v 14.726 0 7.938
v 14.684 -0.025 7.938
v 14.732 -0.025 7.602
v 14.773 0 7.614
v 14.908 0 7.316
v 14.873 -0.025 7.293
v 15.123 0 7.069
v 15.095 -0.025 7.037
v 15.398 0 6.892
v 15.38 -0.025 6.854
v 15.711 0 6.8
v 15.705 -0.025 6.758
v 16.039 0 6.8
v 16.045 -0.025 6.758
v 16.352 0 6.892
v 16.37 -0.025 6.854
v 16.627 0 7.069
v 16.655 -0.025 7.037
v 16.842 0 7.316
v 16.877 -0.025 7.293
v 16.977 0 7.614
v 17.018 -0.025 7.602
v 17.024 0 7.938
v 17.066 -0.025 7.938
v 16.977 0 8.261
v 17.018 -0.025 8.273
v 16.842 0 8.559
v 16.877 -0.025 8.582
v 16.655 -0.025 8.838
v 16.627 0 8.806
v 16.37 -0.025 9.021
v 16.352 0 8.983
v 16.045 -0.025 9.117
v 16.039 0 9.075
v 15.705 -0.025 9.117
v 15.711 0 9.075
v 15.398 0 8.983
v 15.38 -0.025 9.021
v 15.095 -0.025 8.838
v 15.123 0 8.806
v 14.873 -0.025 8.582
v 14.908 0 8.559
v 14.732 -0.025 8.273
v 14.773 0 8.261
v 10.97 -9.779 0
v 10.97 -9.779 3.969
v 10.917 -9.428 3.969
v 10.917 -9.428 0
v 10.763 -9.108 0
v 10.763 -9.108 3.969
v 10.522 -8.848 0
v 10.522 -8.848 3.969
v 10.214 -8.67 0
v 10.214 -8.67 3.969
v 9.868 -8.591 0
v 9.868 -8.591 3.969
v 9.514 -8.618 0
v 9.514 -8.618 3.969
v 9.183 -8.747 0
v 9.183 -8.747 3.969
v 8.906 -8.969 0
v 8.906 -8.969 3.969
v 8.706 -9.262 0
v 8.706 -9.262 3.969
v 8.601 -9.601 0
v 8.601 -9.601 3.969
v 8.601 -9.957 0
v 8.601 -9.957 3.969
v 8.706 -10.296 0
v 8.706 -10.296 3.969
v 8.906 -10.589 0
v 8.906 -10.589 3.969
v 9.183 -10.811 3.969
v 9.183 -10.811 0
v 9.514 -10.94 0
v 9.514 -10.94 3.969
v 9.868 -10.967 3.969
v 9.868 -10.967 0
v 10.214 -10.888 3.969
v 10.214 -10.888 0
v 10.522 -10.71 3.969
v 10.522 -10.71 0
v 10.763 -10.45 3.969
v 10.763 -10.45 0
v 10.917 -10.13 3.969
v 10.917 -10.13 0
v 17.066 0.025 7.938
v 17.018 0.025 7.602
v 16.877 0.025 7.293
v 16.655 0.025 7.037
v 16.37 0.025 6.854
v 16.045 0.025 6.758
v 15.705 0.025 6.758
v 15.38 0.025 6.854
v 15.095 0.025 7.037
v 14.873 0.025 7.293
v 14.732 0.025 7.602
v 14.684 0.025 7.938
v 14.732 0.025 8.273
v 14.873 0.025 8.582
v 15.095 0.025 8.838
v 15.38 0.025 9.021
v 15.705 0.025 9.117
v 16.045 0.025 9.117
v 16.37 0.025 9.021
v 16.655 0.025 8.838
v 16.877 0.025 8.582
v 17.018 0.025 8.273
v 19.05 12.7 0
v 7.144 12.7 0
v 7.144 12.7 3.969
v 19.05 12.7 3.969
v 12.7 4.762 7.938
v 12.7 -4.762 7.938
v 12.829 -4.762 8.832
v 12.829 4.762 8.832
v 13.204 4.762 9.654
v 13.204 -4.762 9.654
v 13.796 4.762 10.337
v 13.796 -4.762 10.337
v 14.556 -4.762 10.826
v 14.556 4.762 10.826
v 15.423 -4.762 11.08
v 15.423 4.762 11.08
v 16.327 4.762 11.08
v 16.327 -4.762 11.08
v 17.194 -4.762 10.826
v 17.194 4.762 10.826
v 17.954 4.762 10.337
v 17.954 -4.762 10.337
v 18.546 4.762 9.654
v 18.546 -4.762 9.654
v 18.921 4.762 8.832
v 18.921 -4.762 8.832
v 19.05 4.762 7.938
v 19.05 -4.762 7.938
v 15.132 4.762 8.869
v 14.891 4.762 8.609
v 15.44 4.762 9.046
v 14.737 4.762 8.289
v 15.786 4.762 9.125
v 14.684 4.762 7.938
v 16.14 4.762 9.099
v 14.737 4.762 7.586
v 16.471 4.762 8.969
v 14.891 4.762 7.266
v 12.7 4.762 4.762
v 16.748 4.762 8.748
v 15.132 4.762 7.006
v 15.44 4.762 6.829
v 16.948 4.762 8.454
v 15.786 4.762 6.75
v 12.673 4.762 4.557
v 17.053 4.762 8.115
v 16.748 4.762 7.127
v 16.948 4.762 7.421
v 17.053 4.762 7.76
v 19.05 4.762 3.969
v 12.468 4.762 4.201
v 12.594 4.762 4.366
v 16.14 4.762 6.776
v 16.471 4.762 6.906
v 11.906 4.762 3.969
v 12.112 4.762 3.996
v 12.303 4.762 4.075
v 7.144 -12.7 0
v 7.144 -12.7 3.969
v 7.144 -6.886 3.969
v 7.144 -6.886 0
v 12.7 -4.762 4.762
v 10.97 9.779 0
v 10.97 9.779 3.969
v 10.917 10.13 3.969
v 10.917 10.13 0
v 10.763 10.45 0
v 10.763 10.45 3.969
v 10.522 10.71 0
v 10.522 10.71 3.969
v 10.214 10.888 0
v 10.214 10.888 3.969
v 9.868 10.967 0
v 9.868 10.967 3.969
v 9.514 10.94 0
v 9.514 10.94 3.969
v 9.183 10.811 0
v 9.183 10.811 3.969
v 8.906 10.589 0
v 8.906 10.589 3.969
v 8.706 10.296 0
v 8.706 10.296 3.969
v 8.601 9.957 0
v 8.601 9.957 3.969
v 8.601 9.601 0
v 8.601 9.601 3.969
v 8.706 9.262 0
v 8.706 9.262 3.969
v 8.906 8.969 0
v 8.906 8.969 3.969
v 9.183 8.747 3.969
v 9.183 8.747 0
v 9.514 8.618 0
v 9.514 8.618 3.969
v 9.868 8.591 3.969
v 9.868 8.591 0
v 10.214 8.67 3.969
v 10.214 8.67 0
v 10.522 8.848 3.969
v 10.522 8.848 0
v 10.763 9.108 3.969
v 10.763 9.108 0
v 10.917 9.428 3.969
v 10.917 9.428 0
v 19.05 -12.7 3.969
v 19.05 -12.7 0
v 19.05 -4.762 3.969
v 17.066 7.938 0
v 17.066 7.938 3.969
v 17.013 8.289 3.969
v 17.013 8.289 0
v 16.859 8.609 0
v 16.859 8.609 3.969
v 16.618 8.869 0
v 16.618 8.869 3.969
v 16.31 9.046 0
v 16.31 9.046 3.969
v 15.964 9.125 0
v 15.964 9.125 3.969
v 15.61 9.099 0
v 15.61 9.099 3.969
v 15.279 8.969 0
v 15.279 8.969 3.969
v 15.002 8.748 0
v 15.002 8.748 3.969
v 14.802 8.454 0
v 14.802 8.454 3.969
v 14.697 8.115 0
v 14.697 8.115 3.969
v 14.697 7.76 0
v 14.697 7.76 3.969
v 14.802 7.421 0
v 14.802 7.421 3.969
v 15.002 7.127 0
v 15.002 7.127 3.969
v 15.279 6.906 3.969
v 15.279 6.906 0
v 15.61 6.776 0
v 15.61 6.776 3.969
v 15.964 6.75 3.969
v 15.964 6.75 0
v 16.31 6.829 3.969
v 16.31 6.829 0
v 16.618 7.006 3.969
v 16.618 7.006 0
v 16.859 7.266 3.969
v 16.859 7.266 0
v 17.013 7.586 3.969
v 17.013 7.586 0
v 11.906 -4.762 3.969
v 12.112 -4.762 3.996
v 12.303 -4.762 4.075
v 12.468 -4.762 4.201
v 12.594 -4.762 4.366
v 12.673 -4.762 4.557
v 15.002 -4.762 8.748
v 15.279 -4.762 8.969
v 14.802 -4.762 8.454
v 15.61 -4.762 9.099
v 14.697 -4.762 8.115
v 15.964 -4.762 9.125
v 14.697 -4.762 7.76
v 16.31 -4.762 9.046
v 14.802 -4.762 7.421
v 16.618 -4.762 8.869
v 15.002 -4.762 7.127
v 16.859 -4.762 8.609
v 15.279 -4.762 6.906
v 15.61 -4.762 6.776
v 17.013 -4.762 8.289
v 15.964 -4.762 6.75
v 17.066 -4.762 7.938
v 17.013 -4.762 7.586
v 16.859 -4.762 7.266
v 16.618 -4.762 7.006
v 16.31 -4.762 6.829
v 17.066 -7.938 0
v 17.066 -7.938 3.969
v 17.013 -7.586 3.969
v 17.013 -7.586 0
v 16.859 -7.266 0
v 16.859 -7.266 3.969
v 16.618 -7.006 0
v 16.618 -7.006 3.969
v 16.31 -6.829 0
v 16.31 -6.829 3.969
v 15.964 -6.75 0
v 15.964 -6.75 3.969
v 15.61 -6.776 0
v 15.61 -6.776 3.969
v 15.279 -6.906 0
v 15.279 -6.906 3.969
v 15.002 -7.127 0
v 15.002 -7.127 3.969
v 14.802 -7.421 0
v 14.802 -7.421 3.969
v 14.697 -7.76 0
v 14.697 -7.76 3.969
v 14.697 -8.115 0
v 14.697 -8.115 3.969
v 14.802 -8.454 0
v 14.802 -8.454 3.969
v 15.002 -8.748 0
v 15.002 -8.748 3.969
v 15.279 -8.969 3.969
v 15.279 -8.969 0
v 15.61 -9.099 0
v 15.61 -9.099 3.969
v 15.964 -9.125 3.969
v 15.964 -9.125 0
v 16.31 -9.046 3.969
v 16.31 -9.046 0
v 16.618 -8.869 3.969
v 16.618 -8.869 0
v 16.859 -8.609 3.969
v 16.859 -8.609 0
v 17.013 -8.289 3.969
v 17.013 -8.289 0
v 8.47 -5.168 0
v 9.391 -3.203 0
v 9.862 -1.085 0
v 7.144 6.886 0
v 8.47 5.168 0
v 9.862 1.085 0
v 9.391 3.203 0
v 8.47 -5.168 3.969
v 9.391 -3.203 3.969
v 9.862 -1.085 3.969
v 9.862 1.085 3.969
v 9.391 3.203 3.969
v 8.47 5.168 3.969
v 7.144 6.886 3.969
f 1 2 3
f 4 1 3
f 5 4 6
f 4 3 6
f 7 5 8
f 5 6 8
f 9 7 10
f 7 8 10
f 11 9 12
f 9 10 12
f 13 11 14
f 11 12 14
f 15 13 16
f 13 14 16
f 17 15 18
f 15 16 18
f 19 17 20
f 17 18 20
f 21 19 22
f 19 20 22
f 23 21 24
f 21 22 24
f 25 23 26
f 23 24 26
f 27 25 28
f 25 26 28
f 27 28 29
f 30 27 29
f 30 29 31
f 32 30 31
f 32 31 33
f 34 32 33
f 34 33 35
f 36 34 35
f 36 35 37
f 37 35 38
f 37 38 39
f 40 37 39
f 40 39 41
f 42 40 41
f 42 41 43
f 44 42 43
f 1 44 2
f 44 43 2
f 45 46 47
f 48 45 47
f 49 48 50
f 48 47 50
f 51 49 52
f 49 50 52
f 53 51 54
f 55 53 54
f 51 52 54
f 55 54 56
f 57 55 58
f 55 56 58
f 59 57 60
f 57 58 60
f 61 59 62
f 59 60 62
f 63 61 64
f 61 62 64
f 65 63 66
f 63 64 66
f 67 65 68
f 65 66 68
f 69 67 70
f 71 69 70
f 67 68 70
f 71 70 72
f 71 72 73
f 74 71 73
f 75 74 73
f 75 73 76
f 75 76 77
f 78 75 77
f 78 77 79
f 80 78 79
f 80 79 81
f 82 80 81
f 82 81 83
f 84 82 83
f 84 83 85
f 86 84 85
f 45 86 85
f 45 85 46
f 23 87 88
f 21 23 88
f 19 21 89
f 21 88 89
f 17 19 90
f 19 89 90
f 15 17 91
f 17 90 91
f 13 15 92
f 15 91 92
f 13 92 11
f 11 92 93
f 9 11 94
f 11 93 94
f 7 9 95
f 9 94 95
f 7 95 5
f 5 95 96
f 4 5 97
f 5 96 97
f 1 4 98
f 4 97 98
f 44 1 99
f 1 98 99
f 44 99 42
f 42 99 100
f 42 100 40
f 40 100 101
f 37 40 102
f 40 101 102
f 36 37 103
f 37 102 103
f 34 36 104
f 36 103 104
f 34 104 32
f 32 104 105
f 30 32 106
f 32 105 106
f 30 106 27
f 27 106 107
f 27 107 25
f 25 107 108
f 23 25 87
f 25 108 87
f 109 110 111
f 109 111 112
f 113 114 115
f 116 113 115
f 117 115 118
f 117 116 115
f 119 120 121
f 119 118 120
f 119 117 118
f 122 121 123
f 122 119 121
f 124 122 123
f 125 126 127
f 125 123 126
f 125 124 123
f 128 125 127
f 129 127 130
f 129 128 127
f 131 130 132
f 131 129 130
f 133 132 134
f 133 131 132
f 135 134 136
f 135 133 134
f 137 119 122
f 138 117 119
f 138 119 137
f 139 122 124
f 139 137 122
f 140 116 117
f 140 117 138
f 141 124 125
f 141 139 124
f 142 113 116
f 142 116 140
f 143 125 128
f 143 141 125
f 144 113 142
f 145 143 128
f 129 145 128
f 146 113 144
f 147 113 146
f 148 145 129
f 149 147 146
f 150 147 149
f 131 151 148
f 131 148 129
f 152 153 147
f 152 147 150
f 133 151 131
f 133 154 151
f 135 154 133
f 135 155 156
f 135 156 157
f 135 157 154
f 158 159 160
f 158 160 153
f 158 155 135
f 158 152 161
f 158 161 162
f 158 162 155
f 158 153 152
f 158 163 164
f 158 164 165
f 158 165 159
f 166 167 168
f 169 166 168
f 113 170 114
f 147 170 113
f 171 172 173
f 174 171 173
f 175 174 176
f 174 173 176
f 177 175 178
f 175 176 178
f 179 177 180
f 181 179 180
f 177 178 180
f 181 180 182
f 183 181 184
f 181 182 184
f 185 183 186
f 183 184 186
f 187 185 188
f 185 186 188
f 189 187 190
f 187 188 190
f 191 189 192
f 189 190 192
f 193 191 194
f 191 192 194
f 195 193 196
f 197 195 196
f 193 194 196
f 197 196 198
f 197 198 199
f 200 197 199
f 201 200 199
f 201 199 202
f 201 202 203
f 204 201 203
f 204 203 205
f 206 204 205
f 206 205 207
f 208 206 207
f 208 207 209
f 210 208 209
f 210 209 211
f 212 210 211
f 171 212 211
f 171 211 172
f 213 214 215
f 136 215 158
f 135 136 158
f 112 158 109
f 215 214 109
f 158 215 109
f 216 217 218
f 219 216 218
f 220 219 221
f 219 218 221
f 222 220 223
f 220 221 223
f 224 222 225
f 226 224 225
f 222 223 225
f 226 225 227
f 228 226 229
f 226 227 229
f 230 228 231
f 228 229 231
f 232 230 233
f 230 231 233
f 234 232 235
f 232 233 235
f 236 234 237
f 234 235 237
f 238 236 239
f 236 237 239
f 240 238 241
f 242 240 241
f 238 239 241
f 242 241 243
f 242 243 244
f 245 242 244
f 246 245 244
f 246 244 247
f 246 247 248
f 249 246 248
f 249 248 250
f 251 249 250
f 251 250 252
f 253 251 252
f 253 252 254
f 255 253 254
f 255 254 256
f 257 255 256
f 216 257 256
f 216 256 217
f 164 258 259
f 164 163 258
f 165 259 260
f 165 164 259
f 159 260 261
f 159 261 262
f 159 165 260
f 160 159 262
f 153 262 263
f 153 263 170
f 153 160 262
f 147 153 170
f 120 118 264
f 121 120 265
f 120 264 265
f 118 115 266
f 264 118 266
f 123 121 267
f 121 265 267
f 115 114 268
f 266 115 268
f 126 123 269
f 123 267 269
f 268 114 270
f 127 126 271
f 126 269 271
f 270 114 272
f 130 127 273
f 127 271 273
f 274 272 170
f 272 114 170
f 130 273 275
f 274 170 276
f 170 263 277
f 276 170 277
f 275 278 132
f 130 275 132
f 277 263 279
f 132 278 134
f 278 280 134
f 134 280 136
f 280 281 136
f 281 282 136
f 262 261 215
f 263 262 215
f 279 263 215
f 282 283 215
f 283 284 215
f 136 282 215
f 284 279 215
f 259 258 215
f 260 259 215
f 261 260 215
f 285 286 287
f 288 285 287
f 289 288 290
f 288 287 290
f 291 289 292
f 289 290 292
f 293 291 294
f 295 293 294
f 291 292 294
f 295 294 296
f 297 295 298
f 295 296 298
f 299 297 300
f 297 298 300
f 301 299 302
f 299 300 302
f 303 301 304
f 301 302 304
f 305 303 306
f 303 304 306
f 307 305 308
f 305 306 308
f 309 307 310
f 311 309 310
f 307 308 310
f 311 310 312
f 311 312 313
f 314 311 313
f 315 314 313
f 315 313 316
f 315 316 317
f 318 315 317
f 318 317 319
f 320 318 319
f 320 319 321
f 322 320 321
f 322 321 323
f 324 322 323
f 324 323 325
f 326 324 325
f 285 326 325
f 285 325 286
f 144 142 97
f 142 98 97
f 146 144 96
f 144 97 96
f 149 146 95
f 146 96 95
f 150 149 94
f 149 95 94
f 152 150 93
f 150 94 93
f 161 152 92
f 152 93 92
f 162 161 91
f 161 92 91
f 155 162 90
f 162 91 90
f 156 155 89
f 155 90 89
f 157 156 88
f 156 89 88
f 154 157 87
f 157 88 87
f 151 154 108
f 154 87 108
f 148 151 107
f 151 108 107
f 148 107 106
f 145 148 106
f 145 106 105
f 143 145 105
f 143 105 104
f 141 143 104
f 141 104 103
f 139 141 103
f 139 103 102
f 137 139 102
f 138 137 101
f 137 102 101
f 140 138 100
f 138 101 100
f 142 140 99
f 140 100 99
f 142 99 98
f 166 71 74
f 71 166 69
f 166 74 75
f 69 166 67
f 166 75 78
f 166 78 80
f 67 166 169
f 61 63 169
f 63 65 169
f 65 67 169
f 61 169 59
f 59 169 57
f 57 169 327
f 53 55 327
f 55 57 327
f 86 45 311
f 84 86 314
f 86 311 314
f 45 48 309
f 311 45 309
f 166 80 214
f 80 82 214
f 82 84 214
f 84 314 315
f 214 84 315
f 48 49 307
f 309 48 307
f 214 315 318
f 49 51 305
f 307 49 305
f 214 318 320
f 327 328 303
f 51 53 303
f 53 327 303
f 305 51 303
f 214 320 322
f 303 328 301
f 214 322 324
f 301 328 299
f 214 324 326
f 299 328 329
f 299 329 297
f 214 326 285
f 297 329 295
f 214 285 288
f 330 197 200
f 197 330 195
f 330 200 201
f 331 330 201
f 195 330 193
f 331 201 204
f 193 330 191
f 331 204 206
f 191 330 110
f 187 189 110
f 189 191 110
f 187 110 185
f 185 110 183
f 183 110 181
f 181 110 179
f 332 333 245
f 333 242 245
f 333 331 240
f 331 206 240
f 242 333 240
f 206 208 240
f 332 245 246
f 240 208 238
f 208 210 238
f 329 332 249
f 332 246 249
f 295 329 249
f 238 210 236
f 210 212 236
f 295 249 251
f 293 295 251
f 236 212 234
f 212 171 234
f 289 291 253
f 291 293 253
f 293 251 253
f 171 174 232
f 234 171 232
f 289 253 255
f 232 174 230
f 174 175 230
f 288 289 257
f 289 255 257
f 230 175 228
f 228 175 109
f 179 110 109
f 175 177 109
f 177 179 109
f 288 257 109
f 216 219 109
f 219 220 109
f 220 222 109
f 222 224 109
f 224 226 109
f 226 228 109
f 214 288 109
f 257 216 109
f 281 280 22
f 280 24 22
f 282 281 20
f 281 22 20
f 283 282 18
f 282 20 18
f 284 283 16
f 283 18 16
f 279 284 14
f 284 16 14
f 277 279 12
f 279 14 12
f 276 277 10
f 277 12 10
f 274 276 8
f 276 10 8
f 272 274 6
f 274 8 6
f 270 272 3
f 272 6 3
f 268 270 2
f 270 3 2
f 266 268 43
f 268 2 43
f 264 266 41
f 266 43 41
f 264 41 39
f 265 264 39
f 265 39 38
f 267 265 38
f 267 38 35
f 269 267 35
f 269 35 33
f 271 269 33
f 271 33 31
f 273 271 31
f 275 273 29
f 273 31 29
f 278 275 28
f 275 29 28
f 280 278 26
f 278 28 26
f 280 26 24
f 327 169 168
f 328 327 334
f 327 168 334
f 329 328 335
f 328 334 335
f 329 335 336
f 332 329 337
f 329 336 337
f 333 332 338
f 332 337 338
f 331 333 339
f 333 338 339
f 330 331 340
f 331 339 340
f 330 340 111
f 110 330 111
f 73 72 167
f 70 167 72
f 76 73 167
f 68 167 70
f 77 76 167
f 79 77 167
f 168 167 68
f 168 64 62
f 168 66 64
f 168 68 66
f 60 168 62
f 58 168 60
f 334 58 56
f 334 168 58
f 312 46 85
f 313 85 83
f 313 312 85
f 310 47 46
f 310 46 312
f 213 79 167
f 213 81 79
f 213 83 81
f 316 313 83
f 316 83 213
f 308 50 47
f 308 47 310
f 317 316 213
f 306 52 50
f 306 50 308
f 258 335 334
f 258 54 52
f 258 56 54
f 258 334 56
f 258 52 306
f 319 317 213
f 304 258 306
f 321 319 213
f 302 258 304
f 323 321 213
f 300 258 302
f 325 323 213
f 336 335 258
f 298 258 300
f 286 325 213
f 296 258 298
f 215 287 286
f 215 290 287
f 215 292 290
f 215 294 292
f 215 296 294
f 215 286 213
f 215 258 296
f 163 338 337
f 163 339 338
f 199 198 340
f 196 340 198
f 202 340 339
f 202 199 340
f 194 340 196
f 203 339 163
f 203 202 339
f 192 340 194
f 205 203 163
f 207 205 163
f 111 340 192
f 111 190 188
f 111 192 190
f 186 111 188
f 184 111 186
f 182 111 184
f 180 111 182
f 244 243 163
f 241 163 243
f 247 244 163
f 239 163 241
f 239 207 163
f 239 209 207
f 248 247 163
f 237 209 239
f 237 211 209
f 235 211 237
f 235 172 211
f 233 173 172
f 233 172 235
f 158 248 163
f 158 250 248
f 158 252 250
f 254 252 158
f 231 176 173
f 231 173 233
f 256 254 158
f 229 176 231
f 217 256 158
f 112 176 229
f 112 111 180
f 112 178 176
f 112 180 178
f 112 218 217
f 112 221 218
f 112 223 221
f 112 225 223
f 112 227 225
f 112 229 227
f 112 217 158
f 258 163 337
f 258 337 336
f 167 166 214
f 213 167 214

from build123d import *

# Parameters (mm, degrees)
SKETCH1_W                         = 19.05
SKETCH1_H                         = 25.4
BOSS_EXTRUDE1_DEPTH               = 3.96875
SKETCH2_R                         = 9.921875
CUT_EXTRUDE1_DEPTH                = 24.236683855
SKETCH3_W                         = 7.14375
SKETCH3_H                         = 25.4
CUT_EXTRUDE2_DEPTH                = 24.236683855
SKETCH4_W                         = 6.35
SKETCH4_H                         = 9.525
BOSS_EXTRUDE2_DEPTH               = 7.14375
TAP_DRILL_FOR_2_HELICOIL1_D       = 2.38252
TAP_DRILL_FOR_2_HELICOIL3_D       = 2.38252
TAP_DRILL_FOR_2_HELICOIL3_DEPTH   = 4.7371
TAP_DRILL_FOR_2_HELICOIL3_TIP     = 0.715781221
TAP_DRILL_FOR_2_HELICOIL3_2_D     = 2.38252
TAP_DRILL_FOR_2_HELICOIL3_2_DEPTH = 4.7371
TAP_DRILL_FOR_2_HELICOIL3_2_TIP   = 0.715781221
FILLET1_R                         = 0.79375
FILLET2_RADIUS                    = 3.175
FILLET2_LENGTH                    = 9.525


with BuildPart() as part:
    # Sketch1 → Boss-Extrude1 (new body)
    with BuildSketch(Plane.XY):
        with Locations((9.525, 0)):
            Rectangle(SKETCH1_W, SKETCH1_H)
    extrude(amount=BOSS_EXTRUDE1_DEPTH)

    # Sketch2 → Cut-Extrude1 (cut, through all)
    with BuildSketch(Plane.XY.offset(3.96875)):
        Circle(SKETCH2_R)
    extrude(amount=-CUT_EXTRUDE1_DEPTH, mode=Mode.SUBTRACT)

    # Sketch3 → Cut-Extrude2 (cut, through all)
    with BuildSketch(Plane.XY.offset(3.96875)):
        with Locations((3.571875, 0)):
            Rectangle(SKETCH3_W, SKETCH3_H)
    extrude(amount=-CUT_EXTRUDE2_DEPTH, mode=Mode.SUBTRACT)

    # Sketch4 → Boss-Extrude2 (add)
    with BuildSketch(Plane.XY.offset(3.96875)):
        with Locations((15.875, 0)):
            Rectangle(SKETCH4_W, SKETCH4_H)
    extrude(amount=BOSS_EXTRUDE2_DEPTH)

    # Tap Drill for #2 Helicoil1 (through all)
    with Locations(Plane(origin=(0, 0, 0), x_dir=(-1, 0, 0), z_dir=(0, 0, -1))):
        with Locations((-9.779, 9.779), (-9.779, -9.779), (-15.875, 7.9375), (-15.875, -7.9375)):
            Hole(TAP_DRILL_FOR_2_HELICOIL1_D / 2)

    # Tap Drill for _2 Helicoil3
    with Locations(Plane(origin=(0, 4.7625, 0), x_dir=(1, 0, 0), z_dir=(0, 1, 0))):
        with Locations((15.875, -7.9375)):
            Hole(TAP_DRILL_FOR_2_HELICOIL3_D / 2, depth=TAP_DRILL_FOR_2_HELICOIL3_DEPTH)
            with Locations((0, 0, -(TAP_DRILL_FOR_2_HELICOIL3_DEPTH + TAP_DRILL_FOR_2_HELICOIL3_TIP / 2))):  # 118° drill point
                Cone(0, TAP_DRILL_FOR_2_HELICOIL3_D / 2, TAP_DRILL_FOR_2_HELICOIL3_TIP, mode=Mode.SUBTRACT)

    # Tap Drill for _2 Helicoil3 2
    with Locations(Plane(origin=(0, -4.7625, 0), x_dir=(-1, 0, 0), z_dir=(0, -1, 0))):
        with Locations((-15.875, -7.9375)):
            Hole(TAP_DRILL_FOR_2_HELICOIL3_2_D / 2, depth=TAP_DRILL_FOR_2_HELICOIL3_2_DEPTH)
            with Locations((0, 0, -(TAP_DRILL_FOR_2_HELICOIL3_2_DEPTH + TAP_DRILL_FOR_2_HELICOIL3_2_TIP / 2))):  # 118° drill point
                Cone(0, TAP_DRILL_FOR_2_HELICOIL3_2_D / 2, TAP_DRILL_FOR_2_HELICOIL3_2_TIP, mode=Mode.SUBTRACT)

    # Fillet1
    fillet1_edges = [part.edges().sort_by_distance(p)[0] for p in [
        (12.7, 0, 3.96875),
    ]]
    fillet(fillet1_edges, radius=FILLET1_R)

    # Fillet2: full round fillet: the end face becomes a half cylinder, R = half its width
    fillet2_face = Plane((15.875, 0, 11.1125), x_dir=(0, 1, 0), z_dir=(0, 0, 1))  # on the end face: x along it, z out of the body
    fillet2_slab = fillet2_face.offset(-FILLET2_RADIUS / 2) * Box(FILLET2_LENGTH, 2 * FILLET2_RADIUS, FILLET2_RADIUS, mode=Mode.PRIVATE)  # the body's end, R deep
    fillet2_round = Plane((15.875, 0, 7.9375), x_dir=(0, 0, 1), z_dir=(0, 1, 0)) * Cylinder(FILLET2_RADIUS, FILLET2_LENGTH, mode=Mode.PRIVATE)  # its axis R under the face
    add(fillet2_slab - fillet2_round, mode=Mode.SUBTRACT)


solid = part.part
